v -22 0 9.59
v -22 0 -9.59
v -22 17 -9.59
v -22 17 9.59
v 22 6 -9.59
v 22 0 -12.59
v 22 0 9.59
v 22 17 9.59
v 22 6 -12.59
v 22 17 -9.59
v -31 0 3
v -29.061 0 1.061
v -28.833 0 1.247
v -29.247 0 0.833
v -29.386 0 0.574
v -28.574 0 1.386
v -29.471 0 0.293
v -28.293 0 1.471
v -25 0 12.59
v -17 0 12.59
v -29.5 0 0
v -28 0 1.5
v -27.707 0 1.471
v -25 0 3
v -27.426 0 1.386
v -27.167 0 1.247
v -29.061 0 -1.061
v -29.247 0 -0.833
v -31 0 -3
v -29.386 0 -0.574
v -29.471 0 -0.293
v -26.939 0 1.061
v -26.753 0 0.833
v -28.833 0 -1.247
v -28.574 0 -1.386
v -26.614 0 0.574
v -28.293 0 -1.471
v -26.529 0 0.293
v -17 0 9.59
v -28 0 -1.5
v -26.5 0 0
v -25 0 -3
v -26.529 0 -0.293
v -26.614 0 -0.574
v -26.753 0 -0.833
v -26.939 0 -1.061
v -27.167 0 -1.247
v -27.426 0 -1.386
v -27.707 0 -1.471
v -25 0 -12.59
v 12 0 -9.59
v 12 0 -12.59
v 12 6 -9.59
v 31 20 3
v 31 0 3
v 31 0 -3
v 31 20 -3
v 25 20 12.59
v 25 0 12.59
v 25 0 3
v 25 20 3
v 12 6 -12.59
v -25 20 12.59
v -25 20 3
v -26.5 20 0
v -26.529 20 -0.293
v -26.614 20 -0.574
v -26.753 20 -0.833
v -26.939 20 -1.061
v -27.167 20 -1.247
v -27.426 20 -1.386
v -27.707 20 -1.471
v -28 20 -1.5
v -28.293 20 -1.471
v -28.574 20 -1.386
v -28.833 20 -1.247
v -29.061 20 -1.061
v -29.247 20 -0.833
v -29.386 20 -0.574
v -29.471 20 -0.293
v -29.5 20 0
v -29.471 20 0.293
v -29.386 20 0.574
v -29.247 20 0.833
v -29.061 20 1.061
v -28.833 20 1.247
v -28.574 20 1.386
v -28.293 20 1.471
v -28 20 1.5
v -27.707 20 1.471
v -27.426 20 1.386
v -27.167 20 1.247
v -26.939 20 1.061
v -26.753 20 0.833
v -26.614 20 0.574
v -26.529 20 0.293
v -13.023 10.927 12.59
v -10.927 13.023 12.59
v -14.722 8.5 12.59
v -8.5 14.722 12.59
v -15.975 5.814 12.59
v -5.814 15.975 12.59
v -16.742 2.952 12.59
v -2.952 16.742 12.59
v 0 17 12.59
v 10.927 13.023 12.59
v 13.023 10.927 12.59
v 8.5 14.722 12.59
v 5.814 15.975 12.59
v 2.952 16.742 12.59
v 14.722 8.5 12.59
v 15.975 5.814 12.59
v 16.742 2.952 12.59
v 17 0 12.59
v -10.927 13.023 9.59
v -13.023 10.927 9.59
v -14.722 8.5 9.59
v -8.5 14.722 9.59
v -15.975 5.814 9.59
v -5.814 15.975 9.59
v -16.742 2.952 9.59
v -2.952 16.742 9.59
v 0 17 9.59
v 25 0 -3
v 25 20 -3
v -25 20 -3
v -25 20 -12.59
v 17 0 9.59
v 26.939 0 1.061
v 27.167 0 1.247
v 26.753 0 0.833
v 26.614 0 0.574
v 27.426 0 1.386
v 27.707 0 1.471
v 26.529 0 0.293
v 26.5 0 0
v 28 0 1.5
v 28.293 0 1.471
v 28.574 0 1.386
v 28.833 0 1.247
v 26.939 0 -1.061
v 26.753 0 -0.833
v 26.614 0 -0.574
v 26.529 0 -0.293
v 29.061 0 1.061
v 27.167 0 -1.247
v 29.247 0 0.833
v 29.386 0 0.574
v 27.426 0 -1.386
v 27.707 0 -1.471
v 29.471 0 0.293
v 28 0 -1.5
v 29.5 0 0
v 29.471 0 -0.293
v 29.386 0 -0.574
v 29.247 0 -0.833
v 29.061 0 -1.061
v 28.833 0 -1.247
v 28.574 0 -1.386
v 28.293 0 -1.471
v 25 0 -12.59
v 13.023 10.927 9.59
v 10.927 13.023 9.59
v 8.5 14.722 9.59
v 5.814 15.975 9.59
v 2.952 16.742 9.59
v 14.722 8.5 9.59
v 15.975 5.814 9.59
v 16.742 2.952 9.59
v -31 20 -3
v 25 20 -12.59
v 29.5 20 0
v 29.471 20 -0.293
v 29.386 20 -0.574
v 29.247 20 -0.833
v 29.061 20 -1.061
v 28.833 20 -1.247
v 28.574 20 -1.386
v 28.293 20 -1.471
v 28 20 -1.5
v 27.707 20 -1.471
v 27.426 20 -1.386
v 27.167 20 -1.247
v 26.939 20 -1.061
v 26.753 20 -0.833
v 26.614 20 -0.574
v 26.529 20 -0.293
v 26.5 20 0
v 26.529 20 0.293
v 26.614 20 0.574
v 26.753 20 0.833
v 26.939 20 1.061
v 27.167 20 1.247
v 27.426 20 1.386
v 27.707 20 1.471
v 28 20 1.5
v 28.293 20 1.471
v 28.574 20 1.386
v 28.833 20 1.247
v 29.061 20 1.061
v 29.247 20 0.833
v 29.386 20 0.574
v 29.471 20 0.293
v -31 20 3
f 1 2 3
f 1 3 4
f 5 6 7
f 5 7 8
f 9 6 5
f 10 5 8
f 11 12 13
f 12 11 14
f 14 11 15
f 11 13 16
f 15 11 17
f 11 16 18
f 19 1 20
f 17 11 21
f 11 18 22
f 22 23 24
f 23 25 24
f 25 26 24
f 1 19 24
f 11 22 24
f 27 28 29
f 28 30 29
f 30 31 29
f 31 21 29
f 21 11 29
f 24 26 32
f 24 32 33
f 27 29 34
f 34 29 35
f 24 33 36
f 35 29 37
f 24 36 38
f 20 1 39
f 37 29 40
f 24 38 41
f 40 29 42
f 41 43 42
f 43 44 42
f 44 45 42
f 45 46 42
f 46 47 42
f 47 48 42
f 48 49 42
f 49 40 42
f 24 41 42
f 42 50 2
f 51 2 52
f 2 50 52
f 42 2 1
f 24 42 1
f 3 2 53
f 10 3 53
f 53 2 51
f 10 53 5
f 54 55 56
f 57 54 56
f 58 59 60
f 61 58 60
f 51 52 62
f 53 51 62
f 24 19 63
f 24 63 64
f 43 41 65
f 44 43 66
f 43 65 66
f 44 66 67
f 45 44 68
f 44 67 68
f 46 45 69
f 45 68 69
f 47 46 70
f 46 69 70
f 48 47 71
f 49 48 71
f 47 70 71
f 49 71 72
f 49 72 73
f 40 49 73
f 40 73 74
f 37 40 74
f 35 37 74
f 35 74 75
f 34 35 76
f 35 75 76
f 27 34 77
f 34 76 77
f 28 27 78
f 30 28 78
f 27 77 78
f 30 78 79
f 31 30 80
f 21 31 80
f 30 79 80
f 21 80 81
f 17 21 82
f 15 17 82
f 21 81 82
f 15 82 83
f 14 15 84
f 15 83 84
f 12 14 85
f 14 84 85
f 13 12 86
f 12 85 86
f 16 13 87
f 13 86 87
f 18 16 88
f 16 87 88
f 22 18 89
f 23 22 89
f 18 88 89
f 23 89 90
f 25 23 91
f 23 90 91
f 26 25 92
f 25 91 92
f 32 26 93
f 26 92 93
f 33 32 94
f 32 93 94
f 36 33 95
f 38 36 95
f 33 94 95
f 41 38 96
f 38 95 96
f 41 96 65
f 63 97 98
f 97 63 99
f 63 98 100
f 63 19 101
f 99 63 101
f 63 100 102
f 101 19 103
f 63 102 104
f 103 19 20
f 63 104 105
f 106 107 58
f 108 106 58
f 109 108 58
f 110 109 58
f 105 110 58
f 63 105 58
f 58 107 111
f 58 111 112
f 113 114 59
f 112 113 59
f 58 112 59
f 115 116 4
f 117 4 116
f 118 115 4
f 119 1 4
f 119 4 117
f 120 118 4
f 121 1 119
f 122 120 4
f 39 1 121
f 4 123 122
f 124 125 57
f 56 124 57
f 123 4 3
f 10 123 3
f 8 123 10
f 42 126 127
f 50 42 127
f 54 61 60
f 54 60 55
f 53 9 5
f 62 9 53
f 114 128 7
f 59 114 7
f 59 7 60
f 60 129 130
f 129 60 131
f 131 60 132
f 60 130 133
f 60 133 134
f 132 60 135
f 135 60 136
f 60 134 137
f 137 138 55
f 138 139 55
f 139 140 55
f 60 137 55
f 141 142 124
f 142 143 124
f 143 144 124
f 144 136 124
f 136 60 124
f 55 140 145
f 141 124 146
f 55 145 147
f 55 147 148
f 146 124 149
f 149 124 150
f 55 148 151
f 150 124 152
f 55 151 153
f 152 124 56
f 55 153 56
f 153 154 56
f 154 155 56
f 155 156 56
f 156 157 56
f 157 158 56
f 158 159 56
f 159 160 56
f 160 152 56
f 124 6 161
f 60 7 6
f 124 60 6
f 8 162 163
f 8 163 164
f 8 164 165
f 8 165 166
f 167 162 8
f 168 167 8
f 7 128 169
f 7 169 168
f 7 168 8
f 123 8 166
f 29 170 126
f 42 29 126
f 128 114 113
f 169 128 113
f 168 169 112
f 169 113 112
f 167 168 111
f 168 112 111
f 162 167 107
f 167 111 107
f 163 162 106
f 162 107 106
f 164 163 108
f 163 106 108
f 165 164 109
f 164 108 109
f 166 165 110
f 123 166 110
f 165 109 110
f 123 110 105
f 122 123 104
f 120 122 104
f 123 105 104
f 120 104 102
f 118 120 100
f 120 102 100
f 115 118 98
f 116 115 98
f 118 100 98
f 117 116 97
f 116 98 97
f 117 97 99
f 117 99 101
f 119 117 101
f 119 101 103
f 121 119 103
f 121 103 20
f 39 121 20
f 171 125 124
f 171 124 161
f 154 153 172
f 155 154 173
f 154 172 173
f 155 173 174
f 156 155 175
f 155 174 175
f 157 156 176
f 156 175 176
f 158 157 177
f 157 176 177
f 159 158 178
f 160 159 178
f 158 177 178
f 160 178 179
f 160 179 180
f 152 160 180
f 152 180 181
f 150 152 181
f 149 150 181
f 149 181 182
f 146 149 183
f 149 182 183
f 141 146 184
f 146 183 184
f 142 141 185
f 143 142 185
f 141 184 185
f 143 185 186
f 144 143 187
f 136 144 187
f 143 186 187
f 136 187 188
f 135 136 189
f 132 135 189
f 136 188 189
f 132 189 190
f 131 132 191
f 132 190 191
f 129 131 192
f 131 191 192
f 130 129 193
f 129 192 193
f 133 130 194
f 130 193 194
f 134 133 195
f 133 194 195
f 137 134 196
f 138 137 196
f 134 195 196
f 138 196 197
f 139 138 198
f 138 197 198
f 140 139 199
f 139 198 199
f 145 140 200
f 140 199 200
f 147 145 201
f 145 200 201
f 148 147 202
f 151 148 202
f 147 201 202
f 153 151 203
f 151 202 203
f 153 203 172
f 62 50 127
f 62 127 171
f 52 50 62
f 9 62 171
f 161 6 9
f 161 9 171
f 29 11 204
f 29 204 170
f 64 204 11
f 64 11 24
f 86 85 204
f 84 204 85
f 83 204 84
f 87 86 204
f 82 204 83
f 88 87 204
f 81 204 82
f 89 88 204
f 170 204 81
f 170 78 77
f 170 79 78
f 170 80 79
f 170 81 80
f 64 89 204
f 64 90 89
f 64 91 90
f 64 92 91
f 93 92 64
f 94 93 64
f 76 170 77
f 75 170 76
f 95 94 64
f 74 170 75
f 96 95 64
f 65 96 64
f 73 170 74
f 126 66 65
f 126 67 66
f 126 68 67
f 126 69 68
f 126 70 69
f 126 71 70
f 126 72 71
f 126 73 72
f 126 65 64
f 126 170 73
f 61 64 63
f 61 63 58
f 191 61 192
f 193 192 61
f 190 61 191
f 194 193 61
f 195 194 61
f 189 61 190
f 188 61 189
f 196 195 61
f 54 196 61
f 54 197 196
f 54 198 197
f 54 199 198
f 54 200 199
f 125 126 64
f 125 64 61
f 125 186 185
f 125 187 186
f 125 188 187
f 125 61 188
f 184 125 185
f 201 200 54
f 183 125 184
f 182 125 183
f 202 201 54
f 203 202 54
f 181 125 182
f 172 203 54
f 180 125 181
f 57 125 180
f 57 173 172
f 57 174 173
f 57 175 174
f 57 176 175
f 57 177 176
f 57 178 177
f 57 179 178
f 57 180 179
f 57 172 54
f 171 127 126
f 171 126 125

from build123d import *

# Parameters (mm, degrees)
SKETCH1_W           = 50
SKETCH1_H           = 25.18
BOSS_EXTRUDE1_DEPTH = 20
SKETCH6_W           = 44
SKETCH6_H           = 19.18
CUT_EXTRUDE4_DEPTH  = 17
CUT_EXTRUDE5_DEPTH  = 3
SKETCH8_W           = 10
SKETCH8_H           = 6
CUT_EXTRUDE6_DEPTH  = 17
SKETCH9_W           = 6
SKETCH9_H           = 6
SKETCH9_R           = 1.5
BOSS_EXTRUDE2_DEPTH = 20


with BuildPart() as part:
    # Sketch1 → Boss-Extrude1 (new body)
    with BuildSketch(Plane(origin=(0, 0, 0), x_dir=(1, 0, 0), z_dir=(0, 1, 0))):
        Rectangle(SKETCH1_W, SKETCH1_H)
    extrude(amount=BOSS_EXTRUDE1_DEPTH)

    # Sketch6 → Cut-Extrude4 (cut)
    with BuildSketch(Plane.XZ):
        Rectangle(SKETCH6_W, SKETCH6_H)
    extrude(amount=-CUT_EXTRUDE4_DEPTH, mode=Mode.SUBTRACT)

    # Sketch7 → Cut-Extrude5 (cut)
    with BuildSketch(Plane.XY.offset(12.59)):
        with BuildLine():
            Line((-17, 0), (17, 0))
            ThreePointArc((17, 0), (0, 17), (-17, 0))
        make_face()
    extrude(amount=-CUT_EXTRUDE5_DEPTH, mode=Mode.SUBTRACT)

    # Sketch8 → Cut-Extrude6 (cut)
    with BuildSketch(Plane(origin=(0, 0, -12.59), x_dir=(-1, 0, 0), z_dir=(0, 0, -1))):
        with Locations((-17, 3)):
            Rectangle(SKETCH8_W, SKETCH8_H)
    extrude(amount=-CUT_EXTRUDE6_DEPTH, mode=Mode.SUBTRACT)

    # Sketch9 → Boss-Extrude2 (add)
    with BuildSketch(Plane(origin=(0, 20, 0), x_dir=(1, 0, 0), z_dir=(0, 1, 0))):
        with Locations((28, 0)):
            Rectangle(SKETCH9_W, SKETCH9_H)
        with Locations((28, 0)):
            Circle(SKETCH9_R, mode=Mode.SUBTRACT)
        with Locations((-28, 0)):
            Rectangle(SKETCH9_W, SKETCH9_H)
        with Locations((-28, 0)):
            Circle(SKETCH9_R, mode=Mode.SUBTRACT)
    extrude(amount=-BOSS_EXTRUDE2_DEPTH)


solid = part.part
